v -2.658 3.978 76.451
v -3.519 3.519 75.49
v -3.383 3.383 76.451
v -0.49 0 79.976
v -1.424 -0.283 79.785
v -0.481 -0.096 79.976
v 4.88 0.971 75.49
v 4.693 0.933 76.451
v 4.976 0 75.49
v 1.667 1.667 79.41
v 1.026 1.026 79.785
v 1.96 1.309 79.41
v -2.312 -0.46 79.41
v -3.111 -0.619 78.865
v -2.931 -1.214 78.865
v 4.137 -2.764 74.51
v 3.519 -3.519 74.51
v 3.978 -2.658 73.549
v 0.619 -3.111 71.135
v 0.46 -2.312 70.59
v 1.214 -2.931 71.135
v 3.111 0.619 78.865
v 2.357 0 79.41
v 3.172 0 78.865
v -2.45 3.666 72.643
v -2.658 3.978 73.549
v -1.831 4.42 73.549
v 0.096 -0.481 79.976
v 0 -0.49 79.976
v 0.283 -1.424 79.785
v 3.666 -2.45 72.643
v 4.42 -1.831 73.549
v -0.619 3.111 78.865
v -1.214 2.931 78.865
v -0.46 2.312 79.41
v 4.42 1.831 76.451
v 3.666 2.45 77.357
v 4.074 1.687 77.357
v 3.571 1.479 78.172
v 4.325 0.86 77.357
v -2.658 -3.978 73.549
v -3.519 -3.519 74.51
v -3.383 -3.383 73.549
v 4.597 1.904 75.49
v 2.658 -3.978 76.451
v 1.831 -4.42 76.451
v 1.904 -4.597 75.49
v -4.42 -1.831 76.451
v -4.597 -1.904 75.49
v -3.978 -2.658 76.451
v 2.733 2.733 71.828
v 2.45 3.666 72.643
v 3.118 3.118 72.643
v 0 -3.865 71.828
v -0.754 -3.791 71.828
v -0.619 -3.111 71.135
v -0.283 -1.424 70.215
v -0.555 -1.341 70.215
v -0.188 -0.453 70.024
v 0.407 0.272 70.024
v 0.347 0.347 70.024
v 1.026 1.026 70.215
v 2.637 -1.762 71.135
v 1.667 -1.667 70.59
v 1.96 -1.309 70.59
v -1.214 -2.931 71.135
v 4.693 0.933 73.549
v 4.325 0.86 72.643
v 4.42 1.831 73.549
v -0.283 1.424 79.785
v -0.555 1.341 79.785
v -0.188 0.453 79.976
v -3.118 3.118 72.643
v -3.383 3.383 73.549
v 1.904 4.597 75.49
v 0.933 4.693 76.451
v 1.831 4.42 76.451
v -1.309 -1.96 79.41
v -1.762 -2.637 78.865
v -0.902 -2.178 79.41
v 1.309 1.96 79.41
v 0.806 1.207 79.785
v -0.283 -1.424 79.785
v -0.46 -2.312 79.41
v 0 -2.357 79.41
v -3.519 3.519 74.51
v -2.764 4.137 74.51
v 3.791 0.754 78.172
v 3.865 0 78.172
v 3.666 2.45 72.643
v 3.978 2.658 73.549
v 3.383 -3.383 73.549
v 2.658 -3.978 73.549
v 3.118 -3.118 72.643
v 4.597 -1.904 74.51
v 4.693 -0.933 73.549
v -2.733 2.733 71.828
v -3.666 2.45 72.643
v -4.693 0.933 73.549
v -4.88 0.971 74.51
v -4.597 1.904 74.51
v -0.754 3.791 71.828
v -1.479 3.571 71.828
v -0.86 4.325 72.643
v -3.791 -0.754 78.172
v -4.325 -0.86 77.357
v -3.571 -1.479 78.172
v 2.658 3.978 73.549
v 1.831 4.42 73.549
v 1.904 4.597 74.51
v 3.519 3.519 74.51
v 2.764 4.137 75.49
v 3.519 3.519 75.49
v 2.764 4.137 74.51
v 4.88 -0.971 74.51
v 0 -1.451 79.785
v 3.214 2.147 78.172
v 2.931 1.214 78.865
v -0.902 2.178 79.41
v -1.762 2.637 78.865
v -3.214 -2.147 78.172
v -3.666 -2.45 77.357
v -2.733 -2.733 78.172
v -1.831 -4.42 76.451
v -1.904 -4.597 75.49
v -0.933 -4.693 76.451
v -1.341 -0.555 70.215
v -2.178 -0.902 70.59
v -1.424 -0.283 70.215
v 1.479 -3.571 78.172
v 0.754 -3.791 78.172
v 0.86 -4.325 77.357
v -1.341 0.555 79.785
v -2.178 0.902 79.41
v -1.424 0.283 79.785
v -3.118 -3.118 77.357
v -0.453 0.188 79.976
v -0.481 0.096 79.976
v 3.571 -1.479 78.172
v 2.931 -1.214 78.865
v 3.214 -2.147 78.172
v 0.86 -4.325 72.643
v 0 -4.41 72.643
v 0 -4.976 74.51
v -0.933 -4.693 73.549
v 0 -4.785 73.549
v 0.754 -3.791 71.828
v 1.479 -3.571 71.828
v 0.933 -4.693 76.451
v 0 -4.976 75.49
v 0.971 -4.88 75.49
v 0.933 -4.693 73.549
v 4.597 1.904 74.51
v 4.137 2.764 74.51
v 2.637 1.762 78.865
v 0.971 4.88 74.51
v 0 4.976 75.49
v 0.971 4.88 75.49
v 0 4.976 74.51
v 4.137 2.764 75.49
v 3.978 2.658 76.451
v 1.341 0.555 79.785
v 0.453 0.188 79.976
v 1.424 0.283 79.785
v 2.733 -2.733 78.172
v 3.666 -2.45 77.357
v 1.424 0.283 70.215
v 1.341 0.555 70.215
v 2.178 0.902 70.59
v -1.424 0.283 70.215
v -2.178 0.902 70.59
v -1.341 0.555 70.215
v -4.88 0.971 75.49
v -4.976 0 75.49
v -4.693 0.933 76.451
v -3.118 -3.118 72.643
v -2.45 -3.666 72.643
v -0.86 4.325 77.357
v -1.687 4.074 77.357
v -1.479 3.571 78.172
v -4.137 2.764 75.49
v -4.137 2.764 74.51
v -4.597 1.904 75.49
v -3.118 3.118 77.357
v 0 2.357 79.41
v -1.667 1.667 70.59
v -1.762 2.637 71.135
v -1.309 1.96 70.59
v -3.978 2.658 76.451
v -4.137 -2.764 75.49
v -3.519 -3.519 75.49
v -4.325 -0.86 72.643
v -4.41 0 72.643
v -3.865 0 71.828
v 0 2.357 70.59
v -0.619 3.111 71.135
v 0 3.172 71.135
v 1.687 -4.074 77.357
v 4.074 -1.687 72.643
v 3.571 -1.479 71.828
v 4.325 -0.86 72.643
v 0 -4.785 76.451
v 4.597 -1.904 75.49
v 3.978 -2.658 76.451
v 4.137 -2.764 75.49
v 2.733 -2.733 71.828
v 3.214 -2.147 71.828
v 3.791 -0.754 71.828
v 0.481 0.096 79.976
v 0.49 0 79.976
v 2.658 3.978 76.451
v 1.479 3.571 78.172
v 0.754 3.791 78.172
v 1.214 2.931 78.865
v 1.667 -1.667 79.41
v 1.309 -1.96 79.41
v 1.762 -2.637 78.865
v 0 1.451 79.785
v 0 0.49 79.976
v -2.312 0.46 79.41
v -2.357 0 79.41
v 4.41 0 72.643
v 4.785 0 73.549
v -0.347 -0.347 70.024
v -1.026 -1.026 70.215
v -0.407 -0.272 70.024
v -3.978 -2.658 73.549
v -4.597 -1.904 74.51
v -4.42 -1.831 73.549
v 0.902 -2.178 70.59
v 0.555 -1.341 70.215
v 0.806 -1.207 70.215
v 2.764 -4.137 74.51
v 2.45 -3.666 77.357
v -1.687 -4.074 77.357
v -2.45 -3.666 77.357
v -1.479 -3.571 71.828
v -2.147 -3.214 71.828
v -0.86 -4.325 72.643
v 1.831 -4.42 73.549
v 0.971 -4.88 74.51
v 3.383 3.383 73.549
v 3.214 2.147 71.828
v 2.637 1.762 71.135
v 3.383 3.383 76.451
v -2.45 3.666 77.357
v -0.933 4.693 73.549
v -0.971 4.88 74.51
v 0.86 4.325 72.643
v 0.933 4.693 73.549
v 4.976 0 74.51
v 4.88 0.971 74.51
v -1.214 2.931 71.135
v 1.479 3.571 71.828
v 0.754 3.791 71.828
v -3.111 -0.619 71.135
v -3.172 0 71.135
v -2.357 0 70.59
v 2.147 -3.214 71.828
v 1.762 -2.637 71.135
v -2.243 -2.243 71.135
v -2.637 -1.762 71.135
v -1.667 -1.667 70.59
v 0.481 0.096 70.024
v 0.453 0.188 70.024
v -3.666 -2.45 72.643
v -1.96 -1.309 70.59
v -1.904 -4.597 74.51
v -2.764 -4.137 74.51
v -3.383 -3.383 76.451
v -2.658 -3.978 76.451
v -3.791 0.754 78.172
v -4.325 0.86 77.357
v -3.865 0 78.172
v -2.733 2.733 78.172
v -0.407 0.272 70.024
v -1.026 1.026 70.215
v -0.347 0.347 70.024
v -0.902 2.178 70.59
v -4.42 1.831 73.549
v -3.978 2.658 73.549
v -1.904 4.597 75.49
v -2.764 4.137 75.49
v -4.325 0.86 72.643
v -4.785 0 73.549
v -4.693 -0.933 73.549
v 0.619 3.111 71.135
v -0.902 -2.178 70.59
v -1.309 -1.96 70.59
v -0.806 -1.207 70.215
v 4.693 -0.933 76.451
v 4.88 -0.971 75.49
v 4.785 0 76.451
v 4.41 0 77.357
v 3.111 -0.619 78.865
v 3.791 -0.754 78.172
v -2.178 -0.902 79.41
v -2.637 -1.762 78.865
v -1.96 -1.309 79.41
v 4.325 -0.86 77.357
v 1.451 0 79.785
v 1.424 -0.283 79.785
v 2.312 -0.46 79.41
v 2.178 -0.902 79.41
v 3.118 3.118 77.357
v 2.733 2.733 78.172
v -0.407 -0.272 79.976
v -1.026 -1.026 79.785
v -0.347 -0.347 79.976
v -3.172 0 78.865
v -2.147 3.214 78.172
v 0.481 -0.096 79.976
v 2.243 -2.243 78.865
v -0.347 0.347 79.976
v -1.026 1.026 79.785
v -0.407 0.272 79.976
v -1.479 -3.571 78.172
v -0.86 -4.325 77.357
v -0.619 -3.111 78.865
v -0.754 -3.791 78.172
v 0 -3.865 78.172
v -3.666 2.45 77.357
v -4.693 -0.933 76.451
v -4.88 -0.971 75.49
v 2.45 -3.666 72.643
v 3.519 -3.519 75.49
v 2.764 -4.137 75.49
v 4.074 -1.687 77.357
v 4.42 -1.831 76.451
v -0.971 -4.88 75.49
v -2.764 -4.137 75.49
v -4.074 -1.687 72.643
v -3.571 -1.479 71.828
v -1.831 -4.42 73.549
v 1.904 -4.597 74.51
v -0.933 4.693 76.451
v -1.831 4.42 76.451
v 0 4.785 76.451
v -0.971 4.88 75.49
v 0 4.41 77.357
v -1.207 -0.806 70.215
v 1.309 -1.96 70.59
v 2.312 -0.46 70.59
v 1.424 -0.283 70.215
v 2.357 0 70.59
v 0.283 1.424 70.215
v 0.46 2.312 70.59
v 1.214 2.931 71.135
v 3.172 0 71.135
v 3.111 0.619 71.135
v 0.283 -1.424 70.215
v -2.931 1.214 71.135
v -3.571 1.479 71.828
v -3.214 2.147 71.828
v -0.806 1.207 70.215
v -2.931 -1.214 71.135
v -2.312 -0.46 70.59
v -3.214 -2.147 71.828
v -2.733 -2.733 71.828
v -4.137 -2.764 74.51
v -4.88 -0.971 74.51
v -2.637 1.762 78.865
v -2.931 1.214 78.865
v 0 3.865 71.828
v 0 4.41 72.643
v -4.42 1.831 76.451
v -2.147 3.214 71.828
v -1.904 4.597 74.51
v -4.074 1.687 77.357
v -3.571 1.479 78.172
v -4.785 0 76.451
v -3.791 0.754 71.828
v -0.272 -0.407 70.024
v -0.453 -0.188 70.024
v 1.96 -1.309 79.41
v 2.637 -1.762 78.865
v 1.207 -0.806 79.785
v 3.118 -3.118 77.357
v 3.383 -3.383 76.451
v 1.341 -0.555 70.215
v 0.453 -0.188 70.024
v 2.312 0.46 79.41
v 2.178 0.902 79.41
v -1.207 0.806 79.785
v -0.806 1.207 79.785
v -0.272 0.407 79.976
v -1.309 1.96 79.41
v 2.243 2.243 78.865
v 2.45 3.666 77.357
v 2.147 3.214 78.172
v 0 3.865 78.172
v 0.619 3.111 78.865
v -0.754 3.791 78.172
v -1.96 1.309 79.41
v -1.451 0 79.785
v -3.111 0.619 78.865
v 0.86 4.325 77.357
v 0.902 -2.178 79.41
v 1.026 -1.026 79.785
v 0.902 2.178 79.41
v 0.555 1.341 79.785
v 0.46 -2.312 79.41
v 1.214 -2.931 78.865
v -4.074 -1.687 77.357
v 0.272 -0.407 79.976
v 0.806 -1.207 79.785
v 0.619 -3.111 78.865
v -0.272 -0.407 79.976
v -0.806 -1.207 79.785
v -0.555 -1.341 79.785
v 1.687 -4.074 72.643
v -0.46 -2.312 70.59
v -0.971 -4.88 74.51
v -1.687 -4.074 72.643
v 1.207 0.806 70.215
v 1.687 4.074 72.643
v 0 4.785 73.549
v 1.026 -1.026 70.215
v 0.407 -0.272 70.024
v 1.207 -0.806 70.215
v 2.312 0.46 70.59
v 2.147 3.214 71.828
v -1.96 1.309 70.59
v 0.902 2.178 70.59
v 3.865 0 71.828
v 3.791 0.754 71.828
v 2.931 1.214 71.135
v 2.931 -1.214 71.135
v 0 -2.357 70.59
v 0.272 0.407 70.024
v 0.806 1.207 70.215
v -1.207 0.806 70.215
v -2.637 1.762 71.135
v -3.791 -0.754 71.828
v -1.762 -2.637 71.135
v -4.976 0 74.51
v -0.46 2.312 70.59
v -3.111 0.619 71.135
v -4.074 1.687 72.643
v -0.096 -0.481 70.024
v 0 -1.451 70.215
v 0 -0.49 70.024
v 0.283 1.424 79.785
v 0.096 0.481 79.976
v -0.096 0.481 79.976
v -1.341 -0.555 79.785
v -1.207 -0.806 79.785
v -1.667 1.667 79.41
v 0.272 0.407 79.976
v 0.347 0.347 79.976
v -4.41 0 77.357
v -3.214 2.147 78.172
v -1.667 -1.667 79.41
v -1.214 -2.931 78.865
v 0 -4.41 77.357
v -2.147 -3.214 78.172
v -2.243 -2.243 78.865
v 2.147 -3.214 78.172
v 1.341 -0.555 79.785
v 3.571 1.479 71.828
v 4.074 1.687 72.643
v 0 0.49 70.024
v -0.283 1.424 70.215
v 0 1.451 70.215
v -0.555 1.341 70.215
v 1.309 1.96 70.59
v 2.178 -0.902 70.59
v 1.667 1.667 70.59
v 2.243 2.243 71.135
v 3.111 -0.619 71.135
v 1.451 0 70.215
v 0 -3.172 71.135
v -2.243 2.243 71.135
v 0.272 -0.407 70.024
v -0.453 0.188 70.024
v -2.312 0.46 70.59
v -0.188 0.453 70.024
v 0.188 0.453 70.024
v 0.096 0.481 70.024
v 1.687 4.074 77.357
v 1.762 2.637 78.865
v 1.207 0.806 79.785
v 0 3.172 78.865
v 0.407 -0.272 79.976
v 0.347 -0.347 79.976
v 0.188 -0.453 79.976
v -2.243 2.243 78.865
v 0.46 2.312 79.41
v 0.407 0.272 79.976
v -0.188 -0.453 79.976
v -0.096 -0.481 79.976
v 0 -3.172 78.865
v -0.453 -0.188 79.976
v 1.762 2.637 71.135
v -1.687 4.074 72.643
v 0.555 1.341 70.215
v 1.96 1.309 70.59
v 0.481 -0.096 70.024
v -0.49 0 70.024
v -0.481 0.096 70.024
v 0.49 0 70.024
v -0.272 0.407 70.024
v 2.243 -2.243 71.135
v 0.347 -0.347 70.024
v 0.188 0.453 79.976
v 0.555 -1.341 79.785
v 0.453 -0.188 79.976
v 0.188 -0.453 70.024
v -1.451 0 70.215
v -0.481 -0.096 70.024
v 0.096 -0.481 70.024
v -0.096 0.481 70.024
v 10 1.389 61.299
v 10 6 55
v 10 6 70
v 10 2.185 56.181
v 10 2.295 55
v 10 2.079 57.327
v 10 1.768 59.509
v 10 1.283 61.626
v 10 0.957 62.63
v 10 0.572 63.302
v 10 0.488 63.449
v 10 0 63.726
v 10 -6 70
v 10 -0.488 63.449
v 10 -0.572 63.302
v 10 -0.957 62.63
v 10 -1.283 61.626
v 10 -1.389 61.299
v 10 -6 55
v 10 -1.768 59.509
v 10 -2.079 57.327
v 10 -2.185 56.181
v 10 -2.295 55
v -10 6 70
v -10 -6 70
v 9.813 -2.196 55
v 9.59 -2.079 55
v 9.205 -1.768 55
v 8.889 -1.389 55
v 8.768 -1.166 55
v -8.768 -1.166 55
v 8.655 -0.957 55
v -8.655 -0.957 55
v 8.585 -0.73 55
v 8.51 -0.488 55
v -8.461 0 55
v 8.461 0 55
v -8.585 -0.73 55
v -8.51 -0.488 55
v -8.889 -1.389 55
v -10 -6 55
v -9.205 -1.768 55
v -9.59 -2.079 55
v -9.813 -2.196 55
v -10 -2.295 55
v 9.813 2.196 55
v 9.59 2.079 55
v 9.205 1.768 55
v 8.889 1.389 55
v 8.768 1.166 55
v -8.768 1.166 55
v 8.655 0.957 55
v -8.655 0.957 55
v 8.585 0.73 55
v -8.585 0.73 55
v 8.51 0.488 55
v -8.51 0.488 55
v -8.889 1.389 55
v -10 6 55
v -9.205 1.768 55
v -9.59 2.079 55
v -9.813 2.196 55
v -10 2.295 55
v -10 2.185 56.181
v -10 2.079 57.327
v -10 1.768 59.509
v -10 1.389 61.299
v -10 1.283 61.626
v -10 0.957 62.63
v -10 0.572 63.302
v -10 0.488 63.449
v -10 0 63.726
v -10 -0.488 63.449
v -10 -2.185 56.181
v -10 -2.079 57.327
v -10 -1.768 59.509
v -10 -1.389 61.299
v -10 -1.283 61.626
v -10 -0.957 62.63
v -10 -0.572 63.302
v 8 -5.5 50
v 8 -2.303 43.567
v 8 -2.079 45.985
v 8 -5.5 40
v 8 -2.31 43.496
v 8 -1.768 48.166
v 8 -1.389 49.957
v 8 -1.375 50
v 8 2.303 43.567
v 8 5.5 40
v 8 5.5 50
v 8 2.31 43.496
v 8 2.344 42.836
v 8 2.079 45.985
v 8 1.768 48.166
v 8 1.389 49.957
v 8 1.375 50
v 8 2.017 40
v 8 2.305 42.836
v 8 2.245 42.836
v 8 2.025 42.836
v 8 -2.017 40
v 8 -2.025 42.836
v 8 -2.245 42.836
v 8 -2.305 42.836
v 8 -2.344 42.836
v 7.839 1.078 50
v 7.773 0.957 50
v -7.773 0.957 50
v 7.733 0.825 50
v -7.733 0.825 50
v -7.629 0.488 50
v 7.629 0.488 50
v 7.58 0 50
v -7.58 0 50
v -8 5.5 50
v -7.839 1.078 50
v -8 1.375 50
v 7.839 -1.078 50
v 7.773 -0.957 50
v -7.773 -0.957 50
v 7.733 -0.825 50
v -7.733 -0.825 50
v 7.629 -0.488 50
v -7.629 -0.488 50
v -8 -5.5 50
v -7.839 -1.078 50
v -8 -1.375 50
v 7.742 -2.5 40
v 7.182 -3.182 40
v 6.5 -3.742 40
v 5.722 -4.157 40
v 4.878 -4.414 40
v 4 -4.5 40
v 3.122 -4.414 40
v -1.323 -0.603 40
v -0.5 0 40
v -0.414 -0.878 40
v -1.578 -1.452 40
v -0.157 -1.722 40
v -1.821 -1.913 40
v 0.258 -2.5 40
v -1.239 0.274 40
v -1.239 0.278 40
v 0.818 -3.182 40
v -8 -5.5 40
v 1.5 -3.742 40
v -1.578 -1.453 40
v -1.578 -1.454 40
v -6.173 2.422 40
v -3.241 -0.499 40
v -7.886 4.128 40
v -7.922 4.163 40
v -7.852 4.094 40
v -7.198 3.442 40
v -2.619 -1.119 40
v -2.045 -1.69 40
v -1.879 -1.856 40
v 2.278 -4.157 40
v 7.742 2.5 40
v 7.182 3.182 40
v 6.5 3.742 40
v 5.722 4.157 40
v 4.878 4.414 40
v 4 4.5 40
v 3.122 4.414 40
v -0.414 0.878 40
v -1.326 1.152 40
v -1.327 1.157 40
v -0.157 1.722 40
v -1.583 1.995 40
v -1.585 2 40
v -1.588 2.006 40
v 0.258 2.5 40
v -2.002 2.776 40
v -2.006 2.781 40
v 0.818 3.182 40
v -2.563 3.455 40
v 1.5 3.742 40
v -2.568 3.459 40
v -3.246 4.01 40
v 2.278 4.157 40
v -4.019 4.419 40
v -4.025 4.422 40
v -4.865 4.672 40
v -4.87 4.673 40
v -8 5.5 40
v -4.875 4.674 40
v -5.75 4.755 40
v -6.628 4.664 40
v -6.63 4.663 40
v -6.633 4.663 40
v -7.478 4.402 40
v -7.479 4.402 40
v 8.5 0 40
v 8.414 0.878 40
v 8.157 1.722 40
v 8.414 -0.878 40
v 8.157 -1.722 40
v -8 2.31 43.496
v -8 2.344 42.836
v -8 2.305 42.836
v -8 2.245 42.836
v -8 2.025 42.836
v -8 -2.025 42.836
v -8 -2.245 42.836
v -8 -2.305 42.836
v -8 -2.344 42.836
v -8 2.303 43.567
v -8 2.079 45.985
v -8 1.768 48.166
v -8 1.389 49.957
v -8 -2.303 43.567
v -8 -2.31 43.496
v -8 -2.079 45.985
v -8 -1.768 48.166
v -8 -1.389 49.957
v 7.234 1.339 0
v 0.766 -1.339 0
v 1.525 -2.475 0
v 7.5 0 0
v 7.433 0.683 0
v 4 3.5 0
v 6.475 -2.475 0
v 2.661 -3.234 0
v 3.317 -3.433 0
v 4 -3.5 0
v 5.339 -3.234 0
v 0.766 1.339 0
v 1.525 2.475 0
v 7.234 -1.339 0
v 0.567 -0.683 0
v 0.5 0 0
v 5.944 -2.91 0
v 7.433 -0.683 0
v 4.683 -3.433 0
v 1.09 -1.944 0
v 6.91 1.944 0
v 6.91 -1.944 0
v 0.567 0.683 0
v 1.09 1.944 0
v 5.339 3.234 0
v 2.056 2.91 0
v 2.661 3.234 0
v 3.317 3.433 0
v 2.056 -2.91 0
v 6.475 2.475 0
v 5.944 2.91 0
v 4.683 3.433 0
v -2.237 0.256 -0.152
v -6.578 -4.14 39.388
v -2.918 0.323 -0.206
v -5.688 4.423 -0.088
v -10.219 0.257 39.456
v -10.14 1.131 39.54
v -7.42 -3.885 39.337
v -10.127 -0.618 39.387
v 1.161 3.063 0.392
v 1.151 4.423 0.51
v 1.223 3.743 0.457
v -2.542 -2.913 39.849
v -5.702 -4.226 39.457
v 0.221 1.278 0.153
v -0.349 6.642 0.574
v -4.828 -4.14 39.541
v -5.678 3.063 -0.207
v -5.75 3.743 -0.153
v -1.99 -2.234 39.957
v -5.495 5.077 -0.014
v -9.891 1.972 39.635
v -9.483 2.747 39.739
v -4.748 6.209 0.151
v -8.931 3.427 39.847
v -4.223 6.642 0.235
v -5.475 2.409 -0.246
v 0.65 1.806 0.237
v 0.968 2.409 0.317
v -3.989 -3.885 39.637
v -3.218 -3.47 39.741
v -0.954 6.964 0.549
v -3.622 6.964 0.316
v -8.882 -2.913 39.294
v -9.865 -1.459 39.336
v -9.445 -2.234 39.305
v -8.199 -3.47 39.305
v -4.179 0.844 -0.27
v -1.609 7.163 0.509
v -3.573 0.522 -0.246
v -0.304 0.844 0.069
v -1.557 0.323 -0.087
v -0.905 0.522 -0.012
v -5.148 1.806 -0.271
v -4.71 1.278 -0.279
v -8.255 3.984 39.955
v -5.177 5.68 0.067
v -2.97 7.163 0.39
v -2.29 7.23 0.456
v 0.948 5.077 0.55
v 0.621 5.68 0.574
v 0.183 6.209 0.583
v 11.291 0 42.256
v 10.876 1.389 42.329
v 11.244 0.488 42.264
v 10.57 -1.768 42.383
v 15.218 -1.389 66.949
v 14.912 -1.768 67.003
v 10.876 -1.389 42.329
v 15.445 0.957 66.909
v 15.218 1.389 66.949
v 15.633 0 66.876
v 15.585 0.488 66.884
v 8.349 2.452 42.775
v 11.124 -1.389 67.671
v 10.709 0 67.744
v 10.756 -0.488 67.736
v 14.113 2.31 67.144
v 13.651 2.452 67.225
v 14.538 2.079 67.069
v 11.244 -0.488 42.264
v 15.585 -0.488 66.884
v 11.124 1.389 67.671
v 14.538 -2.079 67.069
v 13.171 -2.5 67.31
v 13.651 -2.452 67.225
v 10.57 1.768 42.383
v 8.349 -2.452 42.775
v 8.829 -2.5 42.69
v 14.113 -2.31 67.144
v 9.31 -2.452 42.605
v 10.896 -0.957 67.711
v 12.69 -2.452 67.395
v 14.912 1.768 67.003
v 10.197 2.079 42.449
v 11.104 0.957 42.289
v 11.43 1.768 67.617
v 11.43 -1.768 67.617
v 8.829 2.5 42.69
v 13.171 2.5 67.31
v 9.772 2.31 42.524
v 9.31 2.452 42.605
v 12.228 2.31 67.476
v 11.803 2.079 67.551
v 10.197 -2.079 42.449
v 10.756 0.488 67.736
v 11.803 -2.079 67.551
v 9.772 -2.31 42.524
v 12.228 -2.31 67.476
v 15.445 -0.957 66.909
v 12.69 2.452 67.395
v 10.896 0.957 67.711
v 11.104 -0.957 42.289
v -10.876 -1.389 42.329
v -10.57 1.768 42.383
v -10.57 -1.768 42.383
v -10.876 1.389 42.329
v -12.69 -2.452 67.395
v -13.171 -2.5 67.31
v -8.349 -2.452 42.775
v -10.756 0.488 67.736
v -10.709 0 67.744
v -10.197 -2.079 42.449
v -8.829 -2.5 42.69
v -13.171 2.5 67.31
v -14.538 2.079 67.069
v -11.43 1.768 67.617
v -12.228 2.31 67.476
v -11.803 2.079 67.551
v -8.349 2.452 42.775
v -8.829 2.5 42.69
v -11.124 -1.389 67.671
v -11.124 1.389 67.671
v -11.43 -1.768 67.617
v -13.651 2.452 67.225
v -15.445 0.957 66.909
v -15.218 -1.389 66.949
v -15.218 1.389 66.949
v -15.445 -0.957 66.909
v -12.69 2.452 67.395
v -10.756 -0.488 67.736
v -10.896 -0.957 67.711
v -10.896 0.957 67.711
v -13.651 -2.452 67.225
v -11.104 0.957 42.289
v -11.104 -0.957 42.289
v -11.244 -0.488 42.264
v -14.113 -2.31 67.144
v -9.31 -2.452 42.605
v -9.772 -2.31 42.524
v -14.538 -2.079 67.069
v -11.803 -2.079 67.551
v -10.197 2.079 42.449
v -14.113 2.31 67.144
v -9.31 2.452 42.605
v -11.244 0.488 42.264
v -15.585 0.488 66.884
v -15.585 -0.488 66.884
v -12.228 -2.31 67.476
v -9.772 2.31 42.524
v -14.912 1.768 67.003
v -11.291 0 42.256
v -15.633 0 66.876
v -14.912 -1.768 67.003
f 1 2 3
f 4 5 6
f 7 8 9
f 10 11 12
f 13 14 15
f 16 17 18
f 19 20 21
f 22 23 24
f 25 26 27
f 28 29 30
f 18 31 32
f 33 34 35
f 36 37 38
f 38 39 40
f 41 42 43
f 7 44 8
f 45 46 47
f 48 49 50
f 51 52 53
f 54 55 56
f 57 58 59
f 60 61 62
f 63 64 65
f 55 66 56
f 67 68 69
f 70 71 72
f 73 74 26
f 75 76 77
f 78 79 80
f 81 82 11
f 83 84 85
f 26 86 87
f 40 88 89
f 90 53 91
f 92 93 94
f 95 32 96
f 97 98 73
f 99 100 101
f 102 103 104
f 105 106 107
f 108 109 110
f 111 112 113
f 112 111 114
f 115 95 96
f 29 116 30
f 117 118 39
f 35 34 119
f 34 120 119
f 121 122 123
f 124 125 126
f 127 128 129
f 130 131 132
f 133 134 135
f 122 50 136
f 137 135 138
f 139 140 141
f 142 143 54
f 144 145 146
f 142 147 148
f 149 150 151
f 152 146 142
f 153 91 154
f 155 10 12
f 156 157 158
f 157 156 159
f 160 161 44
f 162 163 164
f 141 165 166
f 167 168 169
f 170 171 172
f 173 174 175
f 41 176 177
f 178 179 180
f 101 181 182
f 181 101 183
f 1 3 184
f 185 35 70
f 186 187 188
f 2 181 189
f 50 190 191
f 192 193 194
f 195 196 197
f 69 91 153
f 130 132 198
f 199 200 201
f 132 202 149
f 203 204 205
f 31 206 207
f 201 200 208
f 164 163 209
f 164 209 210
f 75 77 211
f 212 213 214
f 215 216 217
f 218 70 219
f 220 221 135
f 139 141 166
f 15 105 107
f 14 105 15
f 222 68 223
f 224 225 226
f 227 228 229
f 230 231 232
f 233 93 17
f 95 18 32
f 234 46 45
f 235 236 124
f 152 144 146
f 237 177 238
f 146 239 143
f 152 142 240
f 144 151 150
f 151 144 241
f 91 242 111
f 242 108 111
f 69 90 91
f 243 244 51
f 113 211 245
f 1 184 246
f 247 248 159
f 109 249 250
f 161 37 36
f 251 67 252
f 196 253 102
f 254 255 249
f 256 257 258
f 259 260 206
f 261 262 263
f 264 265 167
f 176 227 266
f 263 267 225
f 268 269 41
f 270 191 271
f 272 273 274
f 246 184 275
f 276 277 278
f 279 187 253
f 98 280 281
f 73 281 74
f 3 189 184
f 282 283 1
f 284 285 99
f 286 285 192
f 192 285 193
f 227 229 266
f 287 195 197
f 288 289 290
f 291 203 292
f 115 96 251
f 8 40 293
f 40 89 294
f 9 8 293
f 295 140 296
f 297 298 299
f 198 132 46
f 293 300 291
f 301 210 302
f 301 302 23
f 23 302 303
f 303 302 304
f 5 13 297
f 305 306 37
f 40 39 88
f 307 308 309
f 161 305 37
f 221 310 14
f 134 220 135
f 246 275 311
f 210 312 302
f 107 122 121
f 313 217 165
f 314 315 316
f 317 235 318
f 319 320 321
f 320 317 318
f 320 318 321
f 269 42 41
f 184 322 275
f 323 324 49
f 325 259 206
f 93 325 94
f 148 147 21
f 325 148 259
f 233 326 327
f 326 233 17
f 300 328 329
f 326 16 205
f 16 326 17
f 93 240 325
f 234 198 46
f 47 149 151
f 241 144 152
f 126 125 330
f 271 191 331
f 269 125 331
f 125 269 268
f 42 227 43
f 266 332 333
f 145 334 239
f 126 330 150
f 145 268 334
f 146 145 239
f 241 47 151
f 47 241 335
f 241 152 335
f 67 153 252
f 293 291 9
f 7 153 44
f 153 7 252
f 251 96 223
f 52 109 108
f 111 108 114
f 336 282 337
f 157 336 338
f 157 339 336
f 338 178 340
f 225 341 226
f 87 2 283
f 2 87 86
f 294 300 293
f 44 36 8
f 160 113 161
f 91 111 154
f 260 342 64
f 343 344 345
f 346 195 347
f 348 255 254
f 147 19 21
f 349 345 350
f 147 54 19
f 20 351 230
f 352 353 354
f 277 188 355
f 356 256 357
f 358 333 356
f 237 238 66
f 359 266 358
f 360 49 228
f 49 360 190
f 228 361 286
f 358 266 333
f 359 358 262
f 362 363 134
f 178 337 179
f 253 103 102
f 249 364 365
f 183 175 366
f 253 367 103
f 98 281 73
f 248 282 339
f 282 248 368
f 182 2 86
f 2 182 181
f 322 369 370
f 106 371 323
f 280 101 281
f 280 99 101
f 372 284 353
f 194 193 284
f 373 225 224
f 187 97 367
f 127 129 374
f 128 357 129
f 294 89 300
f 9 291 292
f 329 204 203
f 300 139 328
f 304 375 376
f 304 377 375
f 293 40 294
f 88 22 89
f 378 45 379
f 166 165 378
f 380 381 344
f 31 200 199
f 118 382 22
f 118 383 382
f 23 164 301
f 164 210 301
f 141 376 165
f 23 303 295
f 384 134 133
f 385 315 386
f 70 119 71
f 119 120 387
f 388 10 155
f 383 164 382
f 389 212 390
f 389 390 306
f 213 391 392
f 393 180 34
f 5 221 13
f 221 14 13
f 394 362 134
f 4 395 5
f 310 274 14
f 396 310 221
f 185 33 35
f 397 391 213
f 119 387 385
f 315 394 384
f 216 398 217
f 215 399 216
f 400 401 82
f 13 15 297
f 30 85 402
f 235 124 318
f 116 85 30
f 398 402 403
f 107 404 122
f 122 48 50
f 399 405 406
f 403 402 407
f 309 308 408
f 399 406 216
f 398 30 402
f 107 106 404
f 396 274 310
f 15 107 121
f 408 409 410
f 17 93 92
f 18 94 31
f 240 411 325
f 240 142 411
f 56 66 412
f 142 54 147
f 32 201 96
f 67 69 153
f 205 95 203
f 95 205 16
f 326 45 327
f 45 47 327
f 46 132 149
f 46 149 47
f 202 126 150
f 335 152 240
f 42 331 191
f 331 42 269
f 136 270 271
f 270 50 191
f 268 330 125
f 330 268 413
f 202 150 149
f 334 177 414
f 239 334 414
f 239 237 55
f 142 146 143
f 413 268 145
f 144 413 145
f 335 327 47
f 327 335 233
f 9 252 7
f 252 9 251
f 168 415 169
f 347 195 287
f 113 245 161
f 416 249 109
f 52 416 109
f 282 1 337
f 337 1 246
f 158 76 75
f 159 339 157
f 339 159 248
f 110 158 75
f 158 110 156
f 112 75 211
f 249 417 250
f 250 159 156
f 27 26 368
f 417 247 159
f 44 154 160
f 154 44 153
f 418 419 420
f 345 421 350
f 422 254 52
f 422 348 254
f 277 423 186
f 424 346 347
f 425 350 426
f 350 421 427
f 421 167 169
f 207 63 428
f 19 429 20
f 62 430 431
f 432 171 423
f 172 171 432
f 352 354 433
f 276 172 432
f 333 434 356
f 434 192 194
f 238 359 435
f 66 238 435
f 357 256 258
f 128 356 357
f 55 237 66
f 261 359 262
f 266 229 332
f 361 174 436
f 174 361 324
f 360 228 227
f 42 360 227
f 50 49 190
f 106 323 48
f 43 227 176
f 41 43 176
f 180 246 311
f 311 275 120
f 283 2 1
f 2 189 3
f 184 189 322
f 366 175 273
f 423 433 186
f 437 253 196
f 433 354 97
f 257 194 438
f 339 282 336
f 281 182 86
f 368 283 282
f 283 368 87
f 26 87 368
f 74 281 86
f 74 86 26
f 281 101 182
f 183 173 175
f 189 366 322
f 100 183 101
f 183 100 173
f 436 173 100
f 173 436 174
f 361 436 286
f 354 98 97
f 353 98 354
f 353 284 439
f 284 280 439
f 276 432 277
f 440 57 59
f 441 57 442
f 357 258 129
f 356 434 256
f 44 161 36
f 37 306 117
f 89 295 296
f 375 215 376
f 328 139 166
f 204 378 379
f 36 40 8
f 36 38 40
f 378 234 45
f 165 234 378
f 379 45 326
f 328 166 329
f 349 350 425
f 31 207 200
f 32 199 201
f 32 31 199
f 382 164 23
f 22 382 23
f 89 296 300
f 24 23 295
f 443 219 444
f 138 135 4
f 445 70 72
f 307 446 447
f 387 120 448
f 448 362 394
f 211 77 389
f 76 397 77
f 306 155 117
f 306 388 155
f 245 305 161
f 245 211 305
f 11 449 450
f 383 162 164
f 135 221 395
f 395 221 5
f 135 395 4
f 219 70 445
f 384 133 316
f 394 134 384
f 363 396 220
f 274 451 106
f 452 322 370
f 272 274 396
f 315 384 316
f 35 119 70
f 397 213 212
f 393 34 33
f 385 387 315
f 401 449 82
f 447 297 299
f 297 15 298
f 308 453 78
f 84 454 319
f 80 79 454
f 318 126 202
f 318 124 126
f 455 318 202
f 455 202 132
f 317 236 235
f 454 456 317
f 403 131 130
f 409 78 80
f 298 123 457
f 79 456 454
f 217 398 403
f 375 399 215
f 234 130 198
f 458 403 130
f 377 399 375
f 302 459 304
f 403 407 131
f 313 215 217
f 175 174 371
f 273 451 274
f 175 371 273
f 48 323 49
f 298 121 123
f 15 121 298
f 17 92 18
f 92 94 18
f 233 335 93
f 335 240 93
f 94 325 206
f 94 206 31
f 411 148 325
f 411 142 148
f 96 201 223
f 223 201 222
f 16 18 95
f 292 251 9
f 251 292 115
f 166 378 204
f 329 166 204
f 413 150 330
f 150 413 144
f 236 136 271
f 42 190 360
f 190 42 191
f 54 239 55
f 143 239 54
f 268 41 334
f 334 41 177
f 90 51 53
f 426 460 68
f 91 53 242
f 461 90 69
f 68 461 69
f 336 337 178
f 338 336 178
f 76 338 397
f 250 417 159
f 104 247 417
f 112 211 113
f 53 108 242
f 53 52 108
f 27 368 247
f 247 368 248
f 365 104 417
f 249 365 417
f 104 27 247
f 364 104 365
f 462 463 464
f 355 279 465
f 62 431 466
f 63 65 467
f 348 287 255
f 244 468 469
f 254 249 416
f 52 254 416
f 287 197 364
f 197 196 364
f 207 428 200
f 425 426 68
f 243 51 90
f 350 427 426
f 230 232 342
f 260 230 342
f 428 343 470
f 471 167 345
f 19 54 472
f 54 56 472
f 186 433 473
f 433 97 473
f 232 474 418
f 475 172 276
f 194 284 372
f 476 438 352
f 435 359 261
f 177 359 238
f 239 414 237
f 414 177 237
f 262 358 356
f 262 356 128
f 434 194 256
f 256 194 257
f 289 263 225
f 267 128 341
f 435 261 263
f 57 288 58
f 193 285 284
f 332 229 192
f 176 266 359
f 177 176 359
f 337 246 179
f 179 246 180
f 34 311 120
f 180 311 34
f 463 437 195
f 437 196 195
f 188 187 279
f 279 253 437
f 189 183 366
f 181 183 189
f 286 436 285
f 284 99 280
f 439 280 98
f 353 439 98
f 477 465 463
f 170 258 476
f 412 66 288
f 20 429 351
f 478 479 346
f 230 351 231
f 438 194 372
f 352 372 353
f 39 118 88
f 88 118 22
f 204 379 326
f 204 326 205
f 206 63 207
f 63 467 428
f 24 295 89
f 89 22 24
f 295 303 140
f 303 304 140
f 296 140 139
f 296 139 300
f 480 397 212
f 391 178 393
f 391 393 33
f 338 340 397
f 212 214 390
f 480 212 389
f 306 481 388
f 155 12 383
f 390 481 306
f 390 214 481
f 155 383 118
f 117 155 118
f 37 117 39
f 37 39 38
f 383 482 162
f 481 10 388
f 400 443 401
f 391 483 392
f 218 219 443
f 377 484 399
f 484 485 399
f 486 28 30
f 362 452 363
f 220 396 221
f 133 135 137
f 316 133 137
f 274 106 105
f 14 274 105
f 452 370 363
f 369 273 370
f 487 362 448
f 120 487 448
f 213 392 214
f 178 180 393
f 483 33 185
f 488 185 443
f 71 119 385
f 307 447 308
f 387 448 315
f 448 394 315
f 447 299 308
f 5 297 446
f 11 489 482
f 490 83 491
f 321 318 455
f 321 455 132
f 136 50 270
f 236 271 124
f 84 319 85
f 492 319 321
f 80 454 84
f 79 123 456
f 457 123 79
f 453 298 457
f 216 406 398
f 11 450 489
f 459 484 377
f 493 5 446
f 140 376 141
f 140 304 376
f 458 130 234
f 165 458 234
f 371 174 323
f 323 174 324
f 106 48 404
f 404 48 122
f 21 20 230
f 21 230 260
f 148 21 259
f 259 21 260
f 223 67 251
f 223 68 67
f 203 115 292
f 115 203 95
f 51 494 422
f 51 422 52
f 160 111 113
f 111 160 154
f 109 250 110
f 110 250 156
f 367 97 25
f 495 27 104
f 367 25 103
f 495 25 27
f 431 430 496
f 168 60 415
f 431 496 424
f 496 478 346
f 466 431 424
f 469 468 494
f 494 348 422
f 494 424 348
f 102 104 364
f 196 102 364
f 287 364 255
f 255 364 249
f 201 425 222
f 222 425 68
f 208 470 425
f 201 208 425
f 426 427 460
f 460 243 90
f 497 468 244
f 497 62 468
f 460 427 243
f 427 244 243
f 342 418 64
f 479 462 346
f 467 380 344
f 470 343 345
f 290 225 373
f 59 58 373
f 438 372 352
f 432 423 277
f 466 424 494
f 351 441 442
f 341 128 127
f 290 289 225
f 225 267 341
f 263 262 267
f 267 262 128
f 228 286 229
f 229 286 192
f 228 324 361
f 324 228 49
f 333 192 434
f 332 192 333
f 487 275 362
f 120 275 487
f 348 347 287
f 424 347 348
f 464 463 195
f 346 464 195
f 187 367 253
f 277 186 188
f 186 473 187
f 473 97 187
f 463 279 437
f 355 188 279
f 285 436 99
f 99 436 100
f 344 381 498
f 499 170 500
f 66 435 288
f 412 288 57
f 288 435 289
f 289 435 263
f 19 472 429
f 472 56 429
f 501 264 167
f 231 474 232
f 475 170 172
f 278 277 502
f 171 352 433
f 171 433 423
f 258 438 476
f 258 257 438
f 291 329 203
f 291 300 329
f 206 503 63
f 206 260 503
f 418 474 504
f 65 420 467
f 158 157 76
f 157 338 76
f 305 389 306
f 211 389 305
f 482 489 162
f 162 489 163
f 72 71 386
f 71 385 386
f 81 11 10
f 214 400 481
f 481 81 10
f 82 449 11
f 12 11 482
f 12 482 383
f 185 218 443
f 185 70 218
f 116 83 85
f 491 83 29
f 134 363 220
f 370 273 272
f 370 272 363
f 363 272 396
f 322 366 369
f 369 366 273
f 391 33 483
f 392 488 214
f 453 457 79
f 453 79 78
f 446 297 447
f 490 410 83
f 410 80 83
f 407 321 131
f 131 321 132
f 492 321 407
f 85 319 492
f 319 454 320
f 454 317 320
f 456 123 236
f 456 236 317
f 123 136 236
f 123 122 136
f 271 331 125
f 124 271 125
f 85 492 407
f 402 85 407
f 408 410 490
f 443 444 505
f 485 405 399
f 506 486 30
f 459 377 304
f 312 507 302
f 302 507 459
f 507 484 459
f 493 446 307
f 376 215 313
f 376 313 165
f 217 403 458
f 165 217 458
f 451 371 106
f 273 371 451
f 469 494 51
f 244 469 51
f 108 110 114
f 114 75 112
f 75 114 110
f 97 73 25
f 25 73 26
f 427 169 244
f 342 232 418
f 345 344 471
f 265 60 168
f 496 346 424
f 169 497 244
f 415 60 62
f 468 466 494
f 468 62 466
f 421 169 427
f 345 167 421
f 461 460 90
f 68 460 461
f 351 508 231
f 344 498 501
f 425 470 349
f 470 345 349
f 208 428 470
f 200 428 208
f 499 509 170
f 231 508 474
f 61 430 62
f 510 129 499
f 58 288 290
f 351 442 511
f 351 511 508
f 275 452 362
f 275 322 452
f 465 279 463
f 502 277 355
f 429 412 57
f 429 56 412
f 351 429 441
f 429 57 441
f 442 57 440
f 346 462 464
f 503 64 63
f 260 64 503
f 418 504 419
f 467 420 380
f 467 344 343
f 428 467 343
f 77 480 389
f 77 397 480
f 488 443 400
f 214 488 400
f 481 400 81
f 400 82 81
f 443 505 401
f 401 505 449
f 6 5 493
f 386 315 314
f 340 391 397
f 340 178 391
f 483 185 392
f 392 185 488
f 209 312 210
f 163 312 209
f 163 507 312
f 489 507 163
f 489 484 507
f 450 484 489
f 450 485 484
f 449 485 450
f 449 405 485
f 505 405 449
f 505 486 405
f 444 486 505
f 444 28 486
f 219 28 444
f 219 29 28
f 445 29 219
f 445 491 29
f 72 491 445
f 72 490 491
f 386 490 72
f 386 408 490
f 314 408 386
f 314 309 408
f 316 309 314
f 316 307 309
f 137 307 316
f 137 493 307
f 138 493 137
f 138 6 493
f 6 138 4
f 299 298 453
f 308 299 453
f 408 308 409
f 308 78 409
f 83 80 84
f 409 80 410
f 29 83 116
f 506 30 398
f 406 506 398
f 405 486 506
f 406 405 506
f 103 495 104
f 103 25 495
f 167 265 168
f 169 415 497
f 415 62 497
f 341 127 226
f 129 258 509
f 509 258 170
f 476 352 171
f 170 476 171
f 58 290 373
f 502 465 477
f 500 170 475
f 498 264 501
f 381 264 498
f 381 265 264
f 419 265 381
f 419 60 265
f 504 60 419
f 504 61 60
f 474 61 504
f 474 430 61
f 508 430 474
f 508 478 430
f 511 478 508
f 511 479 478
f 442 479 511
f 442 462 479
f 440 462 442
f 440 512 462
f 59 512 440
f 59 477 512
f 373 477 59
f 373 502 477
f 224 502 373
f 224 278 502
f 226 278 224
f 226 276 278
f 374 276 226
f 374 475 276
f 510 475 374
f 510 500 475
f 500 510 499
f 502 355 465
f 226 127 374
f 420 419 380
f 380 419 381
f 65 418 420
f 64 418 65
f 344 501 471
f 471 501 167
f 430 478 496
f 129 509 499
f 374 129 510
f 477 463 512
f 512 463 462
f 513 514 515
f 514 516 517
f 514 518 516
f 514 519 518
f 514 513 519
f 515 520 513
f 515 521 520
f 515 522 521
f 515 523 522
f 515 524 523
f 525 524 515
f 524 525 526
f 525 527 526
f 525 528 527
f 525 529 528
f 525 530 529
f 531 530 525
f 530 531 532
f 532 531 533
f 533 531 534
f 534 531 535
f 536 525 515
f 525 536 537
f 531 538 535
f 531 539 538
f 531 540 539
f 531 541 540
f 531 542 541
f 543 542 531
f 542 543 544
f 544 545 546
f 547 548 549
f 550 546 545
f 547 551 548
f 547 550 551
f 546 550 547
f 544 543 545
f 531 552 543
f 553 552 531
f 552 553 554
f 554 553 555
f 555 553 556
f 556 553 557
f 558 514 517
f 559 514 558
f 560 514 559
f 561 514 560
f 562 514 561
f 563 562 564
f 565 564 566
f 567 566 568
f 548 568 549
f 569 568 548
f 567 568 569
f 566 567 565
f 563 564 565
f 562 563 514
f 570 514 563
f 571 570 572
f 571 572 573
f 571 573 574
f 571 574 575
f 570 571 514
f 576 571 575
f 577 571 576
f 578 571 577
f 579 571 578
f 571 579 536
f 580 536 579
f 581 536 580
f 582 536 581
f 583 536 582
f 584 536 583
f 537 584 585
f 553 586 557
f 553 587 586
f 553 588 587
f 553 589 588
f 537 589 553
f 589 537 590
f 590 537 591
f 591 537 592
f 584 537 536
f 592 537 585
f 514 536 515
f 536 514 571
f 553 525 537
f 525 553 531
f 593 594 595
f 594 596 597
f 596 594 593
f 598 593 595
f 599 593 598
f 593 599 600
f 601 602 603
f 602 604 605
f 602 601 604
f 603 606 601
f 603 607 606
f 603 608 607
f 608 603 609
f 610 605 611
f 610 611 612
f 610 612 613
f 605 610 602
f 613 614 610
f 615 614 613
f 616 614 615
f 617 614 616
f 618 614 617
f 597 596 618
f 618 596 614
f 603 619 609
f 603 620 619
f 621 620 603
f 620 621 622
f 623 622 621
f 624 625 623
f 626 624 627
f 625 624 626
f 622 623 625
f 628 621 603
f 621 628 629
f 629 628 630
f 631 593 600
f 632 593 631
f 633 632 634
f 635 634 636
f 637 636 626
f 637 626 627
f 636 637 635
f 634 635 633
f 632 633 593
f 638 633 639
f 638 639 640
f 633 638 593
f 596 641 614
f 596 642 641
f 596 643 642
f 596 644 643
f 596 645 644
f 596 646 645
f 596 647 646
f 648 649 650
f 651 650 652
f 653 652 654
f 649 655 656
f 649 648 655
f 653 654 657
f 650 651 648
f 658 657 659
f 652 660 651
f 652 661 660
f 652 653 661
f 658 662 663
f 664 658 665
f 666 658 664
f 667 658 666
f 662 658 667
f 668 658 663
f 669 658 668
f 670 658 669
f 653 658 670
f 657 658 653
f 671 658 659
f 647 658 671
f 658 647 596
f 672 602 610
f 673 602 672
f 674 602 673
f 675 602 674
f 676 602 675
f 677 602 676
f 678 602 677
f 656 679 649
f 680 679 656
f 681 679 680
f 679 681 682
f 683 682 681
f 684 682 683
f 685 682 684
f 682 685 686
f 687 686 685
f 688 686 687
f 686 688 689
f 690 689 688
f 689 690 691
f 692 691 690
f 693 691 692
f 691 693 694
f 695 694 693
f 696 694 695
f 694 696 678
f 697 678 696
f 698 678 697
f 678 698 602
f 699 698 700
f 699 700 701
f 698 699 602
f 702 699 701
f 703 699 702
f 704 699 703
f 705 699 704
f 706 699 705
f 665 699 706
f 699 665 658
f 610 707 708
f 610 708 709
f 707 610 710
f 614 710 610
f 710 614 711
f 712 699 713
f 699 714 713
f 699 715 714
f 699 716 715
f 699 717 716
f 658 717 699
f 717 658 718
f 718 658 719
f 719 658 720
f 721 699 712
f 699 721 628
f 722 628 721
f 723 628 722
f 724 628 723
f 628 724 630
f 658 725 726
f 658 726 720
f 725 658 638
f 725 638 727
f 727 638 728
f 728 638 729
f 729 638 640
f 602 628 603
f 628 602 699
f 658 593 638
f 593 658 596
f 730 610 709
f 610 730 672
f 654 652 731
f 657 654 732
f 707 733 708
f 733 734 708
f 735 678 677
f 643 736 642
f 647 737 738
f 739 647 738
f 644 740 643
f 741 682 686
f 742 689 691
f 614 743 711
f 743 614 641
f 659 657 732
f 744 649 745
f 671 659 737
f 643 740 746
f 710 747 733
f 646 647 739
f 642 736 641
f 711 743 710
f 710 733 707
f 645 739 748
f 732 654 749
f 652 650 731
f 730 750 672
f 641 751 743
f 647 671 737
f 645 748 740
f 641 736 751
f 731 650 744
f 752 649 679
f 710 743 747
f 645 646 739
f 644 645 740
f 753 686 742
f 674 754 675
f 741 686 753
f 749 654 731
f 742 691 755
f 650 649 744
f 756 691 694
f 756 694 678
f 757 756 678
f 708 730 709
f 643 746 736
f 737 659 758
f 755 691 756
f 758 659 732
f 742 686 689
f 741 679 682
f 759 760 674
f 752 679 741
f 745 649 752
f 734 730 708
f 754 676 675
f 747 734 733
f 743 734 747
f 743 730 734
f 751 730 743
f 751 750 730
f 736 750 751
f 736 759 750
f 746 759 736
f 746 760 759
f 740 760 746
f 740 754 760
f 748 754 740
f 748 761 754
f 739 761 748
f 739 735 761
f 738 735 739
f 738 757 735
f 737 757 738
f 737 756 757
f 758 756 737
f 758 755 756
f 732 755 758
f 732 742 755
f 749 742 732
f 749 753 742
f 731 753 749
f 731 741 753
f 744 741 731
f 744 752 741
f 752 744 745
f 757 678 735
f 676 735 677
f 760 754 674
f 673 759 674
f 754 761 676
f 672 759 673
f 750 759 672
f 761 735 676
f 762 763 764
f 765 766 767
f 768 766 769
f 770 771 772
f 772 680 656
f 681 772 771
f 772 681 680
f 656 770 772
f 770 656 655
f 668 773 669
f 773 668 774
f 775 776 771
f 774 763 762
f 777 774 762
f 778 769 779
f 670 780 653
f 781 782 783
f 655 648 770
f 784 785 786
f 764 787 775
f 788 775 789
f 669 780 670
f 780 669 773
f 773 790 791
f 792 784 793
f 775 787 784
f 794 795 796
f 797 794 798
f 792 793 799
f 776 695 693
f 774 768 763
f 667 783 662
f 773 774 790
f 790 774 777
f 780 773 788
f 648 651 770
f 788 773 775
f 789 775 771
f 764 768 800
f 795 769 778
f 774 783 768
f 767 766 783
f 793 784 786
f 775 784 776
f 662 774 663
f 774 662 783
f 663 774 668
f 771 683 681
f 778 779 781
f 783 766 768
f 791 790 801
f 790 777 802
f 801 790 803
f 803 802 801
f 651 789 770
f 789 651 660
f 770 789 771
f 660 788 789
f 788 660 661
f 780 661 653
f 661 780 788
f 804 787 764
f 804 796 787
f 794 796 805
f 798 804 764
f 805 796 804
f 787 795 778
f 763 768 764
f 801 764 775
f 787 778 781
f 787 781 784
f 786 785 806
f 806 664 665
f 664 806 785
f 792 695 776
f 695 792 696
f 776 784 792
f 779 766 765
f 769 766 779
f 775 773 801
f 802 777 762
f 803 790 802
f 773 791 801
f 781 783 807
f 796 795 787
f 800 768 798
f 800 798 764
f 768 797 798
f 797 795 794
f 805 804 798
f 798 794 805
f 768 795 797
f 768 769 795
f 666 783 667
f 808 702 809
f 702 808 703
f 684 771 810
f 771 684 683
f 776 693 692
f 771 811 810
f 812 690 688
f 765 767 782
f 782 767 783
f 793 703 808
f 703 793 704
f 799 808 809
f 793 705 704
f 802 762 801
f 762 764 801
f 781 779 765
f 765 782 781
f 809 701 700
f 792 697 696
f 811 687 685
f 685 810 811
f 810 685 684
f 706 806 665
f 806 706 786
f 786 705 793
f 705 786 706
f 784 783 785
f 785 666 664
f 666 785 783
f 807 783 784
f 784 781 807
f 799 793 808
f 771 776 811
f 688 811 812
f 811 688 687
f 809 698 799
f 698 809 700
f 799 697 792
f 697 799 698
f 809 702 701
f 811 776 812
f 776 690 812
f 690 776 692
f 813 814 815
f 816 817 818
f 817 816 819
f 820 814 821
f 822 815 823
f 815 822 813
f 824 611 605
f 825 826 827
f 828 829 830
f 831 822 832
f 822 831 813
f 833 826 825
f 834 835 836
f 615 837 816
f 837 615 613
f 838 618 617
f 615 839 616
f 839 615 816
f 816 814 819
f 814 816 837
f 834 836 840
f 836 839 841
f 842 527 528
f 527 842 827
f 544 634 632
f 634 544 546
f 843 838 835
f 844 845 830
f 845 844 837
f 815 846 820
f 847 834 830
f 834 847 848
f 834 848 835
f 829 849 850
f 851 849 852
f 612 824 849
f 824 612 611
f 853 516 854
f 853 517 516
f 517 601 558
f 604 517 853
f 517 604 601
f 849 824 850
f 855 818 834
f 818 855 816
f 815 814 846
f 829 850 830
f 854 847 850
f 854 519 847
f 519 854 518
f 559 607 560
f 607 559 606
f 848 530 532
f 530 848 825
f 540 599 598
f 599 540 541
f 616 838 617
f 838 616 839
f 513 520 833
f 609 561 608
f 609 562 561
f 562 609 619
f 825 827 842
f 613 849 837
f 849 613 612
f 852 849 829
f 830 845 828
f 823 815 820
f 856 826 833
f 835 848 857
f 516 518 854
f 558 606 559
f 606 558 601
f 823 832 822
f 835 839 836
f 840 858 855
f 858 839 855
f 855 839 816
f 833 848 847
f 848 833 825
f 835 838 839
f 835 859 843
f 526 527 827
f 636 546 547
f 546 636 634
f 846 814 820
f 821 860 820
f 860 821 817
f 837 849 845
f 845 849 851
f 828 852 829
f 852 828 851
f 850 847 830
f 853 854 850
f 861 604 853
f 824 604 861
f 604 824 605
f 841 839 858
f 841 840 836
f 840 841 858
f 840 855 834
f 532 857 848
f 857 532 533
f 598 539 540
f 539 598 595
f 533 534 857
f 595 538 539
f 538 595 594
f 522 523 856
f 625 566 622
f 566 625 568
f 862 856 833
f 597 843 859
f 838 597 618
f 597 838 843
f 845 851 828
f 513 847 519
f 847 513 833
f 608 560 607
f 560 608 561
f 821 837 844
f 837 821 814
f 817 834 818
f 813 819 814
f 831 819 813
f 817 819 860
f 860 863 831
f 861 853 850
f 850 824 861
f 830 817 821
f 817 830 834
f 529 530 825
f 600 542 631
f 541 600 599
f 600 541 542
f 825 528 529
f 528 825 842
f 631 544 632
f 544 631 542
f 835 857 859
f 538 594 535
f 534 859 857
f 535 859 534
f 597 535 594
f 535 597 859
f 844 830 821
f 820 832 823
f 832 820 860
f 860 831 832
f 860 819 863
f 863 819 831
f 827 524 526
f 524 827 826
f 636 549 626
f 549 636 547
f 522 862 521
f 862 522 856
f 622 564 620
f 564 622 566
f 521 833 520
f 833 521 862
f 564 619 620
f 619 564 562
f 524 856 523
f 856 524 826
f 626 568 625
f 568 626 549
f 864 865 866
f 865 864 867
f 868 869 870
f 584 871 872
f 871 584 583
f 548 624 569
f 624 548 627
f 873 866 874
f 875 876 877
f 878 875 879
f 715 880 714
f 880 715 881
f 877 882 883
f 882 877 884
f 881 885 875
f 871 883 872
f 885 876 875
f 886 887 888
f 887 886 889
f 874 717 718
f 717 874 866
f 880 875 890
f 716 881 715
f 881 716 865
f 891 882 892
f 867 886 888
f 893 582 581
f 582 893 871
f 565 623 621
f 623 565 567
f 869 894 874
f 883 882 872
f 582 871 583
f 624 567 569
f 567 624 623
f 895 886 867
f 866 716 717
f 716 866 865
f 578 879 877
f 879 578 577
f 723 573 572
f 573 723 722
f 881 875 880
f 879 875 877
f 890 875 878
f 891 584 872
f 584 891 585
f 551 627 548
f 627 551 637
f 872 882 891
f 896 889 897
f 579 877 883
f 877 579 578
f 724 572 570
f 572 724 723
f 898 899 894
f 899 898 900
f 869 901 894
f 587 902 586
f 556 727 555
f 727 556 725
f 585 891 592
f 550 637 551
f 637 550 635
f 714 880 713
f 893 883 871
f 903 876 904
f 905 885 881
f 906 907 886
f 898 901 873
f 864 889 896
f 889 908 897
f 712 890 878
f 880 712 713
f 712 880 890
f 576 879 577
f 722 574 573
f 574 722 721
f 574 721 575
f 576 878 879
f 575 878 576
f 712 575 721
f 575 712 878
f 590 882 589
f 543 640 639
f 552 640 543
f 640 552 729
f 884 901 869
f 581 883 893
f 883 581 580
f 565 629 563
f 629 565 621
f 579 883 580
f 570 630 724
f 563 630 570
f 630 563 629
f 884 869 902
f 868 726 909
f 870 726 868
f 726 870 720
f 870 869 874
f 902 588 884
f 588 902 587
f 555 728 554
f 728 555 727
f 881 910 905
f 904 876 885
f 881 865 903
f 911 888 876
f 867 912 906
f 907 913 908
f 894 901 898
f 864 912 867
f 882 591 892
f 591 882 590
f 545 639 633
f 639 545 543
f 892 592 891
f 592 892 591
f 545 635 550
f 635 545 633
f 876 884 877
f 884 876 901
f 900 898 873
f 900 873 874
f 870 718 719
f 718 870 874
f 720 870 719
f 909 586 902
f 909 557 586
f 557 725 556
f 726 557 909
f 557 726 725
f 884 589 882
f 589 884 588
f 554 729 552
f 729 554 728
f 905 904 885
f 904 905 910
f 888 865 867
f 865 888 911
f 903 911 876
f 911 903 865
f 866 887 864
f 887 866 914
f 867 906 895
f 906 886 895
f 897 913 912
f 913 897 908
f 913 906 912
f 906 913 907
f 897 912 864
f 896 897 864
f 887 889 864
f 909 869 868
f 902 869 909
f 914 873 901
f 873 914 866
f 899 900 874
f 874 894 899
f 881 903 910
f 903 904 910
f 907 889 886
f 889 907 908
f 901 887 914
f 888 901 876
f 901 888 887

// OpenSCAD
// ==========================================================
// GREEK CANON / IDEALIZED - 8 HEADS PROPORTION MODEL
// ==========================================================

// --- Rendering Resolution ---
$fn = 32;

// --- Base Module Unit: 1 Head Height = 10 Units ---
head_h = 10; 

greek_ideal_mannequin();

module greek_ideal_mannequin() {
    color("ghostwhite") {
        
        // 1. HEAD (7.0 to 8.0 heads in overall height)
        translate([0, 0, 7.5 * head_h])
            sphere(r = head_h / 2);

        // 2. THORAX & CHEST (5.5 to 7.0 heads)
        translate([0, 0, 6.25 * head_h])
            cube([head_h * 2, head_h * 1.2, head_h * 1.5], center=true);

        // 3. PELVIS & HIPS (4.0 to 5.0 heads)
        translate([0, 0, 4.5 * head_h])
            cube([head_h * 1.6, head_h * 1.1, head_h * 1], center=true);

        // 4. LEGS (0.0 to 4.0 heads)
        // Right Leg (Engaged / Weight-bearing - straight)
        translate([head_h * 0.4, 0, 2 * head_h])
            cylinder(h = 4 * head_h, r1 = head_h * 0.35, r2 = head_h * 0.45, center=true);

        // Left Leg (Free / Relaxed - bent)
        translate([-head_h * 0.4, head_h * 0.2, 2 * head_h])
            rotate([5, -5, 0])
                cylinder(h = 4 * head_h, r1 = head_h * 0.35, r2 = head_h * 0.45, center=true);
                
        // 5. ARMS (4.5 to 6.5 heads)
        // Right Arm
        translate([head_h * 1.1, 0, 5.5 * head_h])
            rotate([0, 10, 0])
                cylinder(h = 2.5 * head_h, r = head_h * 0.25, center=true);

        // Left Arm
        translate([-head_h * 1.1, 0, 5.5 * head_h])
            rotate([0, -10, 0])
                cylinder(h = 2.5 * head_h, r = head_h * 0.25, center=true);
    }
}
